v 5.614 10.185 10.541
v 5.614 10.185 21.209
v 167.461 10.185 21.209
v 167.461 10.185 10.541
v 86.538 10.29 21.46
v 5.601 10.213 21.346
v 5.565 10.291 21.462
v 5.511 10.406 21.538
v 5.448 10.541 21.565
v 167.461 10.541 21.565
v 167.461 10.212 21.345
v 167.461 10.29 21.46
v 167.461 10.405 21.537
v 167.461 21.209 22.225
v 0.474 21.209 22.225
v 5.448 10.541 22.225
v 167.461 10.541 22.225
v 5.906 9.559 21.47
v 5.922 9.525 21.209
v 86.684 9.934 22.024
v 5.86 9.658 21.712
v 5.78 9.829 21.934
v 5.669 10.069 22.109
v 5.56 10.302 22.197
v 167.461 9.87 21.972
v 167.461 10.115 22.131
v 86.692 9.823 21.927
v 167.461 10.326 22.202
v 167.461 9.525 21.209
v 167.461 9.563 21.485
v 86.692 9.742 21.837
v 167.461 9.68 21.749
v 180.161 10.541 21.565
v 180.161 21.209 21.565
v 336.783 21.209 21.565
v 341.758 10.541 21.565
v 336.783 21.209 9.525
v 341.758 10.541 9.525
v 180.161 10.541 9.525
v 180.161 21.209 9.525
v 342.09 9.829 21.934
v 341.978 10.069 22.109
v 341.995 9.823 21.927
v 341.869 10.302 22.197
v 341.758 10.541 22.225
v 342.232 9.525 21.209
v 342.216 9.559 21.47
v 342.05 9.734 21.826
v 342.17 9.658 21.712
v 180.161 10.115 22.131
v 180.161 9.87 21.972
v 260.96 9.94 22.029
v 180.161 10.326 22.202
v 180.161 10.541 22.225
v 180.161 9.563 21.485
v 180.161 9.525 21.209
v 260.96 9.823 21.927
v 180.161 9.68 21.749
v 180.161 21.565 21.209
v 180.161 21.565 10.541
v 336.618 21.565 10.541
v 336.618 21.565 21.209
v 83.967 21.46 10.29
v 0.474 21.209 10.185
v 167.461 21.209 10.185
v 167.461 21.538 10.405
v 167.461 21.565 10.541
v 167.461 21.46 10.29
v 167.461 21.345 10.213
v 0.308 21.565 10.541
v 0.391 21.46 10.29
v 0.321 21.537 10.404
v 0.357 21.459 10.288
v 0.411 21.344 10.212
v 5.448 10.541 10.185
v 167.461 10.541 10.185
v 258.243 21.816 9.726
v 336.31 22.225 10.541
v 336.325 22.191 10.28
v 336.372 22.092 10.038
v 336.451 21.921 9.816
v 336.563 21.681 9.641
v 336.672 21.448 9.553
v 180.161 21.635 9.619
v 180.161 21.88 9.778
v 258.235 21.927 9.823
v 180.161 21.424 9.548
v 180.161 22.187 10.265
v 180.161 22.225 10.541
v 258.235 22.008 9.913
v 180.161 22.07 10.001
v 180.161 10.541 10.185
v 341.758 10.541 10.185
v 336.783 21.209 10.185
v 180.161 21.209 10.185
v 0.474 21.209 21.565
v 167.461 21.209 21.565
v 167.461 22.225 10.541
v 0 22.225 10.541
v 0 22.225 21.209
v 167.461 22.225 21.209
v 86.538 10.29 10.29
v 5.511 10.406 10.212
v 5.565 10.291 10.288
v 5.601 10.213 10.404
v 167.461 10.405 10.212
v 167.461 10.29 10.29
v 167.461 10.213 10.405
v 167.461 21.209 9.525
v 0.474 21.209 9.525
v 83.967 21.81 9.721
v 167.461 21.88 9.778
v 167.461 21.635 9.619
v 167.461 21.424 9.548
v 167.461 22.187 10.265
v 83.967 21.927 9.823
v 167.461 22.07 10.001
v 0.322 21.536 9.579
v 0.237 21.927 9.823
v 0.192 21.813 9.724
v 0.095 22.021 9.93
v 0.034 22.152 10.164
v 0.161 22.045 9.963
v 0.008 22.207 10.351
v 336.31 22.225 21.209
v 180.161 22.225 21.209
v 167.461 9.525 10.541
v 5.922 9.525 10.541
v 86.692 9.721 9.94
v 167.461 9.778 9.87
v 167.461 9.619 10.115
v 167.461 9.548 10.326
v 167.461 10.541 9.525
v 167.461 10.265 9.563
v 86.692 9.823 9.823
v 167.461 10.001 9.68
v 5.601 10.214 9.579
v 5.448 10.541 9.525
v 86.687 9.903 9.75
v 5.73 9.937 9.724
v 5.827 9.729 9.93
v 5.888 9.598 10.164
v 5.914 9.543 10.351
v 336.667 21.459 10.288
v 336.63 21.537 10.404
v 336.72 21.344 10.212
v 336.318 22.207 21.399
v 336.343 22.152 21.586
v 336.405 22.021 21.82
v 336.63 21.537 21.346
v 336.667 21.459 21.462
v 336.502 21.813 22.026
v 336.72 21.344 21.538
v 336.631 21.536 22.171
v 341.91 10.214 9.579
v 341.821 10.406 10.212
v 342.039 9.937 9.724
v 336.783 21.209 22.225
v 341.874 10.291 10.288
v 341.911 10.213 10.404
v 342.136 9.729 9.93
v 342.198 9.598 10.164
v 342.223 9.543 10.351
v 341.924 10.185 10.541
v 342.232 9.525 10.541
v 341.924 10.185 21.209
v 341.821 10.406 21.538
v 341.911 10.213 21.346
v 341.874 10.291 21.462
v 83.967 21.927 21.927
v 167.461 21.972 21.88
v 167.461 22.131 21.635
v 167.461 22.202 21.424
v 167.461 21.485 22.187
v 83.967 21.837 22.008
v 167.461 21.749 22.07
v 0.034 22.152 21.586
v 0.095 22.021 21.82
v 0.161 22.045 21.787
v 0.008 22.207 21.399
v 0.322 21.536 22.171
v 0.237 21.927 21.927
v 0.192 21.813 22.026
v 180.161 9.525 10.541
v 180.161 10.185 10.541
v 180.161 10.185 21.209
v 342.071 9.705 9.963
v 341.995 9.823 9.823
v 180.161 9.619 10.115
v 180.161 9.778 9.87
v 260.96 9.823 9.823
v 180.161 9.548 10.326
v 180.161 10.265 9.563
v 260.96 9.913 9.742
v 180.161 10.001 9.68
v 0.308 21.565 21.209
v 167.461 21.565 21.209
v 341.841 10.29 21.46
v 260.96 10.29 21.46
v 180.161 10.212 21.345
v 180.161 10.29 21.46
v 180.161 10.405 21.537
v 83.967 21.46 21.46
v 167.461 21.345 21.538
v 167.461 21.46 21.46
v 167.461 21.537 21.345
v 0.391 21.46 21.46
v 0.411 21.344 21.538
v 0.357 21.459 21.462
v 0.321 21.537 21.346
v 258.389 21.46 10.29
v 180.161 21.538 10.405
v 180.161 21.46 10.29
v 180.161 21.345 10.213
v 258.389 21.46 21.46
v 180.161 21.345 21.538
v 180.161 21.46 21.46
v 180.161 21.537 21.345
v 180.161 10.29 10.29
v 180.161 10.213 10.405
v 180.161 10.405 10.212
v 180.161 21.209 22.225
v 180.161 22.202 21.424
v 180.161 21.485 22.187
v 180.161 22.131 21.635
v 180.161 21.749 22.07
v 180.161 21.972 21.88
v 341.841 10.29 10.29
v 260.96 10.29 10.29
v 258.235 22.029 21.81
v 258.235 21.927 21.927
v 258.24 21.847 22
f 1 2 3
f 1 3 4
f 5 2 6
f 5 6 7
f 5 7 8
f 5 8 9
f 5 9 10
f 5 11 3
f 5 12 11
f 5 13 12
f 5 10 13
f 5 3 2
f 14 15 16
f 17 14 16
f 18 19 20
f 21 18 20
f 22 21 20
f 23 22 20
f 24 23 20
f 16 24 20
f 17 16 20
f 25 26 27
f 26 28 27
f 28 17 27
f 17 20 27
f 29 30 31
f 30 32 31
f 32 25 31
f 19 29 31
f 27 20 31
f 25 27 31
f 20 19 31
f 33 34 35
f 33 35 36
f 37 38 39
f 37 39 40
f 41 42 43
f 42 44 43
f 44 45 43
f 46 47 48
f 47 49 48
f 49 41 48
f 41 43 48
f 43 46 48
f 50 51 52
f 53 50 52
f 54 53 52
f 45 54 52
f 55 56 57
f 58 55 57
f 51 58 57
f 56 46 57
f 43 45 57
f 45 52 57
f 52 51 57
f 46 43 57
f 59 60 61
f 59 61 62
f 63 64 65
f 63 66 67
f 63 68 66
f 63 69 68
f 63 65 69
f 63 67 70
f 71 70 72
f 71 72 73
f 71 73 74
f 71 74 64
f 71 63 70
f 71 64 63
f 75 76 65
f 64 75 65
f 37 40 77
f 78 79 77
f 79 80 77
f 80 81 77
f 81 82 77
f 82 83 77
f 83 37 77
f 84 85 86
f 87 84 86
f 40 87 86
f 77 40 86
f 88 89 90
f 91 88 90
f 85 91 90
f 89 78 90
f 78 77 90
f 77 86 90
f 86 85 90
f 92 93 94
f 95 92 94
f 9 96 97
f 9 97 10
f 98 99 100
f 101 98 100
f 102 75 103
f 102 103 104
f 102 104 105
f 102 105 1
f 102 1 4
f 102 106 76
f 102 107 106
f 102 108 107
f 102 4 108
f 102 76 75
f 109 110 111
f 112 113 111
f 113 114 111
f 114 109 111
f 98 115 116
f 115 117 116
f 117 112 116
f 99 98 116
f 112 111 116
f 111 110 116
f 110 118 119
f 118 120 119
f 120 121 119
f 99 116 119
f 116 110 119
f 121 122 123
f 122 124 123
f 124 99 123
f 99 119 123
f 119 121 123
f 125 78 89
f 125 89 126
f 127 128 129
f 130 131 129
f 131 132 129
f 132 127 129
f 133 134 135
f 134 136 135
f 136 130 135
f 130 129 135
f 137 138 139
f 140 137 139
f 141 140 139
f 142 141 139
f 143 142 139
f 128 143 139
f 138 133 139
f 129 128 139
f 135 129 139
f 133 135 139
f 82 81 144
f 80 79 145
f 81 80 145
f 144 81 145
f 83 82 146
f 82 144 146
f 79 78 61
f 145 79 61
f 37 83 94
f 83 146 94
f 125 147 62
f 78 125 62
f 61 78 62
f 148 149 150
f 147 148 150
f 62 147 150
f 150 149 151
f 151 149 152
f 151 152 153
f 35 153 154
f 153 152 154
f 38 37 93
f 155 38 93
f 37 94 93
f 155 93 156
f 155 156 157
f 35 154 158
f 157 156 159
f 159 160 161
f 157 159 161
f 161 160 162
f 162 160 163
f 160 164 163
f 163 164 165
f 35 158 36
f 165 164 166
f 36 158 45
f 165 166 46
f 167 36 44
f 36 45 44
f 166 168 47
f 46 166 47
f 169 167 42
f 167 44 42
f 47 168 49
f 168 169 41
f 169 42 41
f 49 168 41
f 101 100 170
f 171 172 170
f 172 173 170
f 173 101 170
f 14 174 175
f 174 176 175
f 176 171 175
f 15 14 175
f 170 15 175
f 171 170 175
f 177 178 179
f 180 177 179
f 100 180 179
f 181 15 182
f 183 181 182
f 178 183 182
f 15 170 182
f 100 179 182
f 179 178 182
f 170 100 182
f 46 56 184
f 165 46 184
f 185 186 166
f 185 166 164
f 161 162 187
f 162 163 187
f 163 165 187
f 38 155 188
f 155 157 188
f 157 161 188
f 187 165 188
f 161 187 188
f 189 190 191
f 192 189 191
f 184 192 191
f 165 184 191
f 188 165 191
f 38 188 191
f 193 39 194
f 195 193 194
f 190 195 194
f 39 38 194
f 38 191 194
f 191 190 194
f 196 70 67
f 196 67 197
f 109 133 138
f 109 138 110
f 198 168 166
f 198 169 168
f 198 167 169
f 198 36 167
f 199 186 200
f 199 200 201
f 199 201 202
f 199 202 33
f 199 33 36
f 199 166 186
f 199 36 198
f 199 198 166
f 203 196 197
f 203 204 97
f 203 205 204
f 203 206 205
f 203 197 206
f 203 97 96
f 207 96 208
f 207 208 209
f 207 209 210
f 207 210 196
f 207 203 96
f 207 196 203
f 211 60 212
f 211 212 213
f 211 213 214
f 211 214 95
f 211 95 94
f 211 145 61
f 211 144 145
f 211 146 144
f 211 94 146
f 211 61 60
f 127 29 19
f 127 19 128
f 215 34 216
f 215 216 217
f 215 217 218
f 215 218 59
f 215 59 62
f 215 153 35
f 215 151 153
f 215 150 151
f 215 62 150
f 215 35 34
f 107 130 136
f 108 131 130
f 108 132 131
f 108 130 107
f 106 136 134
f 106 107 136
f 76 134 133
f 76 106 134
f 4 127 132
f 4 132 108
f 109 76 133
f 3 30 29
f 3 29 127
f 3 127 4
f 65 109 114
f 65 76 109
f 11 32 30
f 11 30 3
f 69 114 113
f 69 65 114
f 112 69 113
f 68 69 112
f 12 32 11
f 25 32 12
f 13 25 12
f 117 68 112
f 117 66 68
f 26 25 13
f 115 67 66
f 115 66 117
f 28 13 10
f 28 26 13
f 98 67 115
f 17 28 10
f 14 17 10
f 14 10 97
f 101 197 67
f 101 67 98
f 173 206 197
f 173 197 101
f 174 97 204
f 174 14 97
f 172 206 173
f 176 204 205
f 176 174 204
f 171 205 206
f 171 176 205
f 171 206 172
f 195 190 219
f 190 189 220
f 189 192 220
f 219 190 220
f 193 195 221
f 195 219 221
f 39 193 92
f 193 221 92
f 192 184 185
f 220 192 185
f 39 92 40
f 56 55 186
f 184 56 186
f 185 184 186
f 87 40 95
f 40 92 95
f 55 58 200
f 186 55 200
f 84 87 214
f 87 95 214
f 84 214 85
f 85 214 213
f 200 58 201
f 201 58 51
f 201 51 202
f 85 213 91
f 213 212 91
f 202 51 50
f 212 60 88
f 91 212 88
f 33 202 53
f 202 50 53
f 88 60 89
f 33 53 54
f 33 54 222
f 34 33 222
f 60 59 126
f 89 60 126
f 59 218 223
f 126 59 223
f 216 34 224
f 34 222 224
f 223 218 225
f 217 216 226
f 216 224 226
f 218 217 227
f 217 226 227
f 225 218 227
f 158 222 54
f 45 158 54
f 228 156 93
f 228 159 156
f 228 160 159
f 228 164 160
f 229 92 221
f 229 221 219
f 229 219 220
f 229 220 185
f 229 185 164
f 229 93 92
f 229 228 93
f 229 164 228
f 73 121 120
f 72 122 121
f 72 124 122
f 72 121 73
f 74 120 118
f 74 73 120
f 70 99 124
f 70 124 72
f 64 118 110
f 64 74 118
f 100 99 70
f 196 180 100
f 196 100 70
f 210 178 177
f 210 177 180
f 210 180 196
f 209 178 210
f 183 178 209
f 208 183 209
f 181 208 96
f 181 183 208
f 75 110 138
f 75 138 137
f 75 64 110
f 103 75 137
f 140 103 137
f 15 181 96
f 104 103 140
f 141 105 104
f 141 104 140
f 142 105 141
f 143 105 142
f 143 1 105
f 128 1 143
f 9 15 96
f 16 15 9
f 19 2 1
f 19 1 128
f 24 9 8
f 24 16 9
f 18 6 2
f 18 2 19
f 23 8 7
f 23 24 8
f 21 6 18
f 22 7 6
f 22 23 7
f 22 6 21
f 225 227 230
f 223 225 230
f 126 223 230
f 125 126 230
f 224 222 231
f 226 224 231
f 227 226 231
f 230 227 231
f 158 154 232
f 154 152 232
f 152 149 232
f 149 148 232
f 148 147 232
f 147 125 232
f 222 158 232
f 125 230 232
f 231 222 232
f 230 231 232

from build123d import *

# Parameters (mm, degrees)
BOSS_EXTRUDE1_DEPTH = 393.7
SCALE1_SCALE_X      = 1
SCALE1_SCALE_Y      = 0.4
SCALE1_SCALE_Z      = 0.4
SKETCH2_W           = 12.7
SKETCH2_H           = 12.7
CUT_EXTRUDE1_DEPTH  = 395.531279762


with BuildPart() as part:
    # Sketch1 → Boss-Extrude1 (new body)
    with BuildSketch(Plane(origin=(0, 0, 0), x_dir=(0, 0, -1), z_dir=(1, 0, 0))):
        with BuildLine():
            Line((0, 2.54), (0, 29.21))
            ThreePointArc((0, 29.21), (-0.743948776, 31.006051224), (-2.54, 31.75))
            Line((-2.54, 31.75), (-29.21, 31.75))
            ThreePointArc((-29.21, 31.75), (-31.006051224, 31.006051224), (-31.75, 29.21))
            Line((-31.75, 29.21), (-31.75, 2.54))
            ThreePointArc((-31.75, 2.54), (-31.006051224, 0.743948776), (-29.21, 0))
            Line((-29.21, 0), (-2.54, 0))
            ThreePointArc((-2.54, 0), (-0.743948776, 0.743948776), (0, 2.54))
        make_face()
        with BuildLine():
            Line((-1.651, 2.54), (-1.651, 29.21))
            ThreePointArc((-1.651, 29.21), (-1.911382072, 29.838617928), (-2.54, 30.099))
            Line((-2.54, 30.099), (-29.21, 30.099))
            ThreePointArc((-29.21, 30.099), (-29.838617928, 29.838617928), (-30.099, 29.21))
            Line((-30.099, 29.21), (-30.099, 2.54))
            ThreePointArc((-30.099, 2.54), (-29.838617928, 1.911382072), (-29.21, 1.651))
            Line((-29.21, 1.651), (-2.54, 1.651))
            ThreePointArc((-2.54, 1.651), (-1.911382072, 1.911382072), (-1.651, 2.54))
        make_face(mode=Mode.SUBTRACT)
    extrude(amount=BOSS_EXTRUDE1_DEPTH)


with BuildPart() as part_1:
    # Scale1: scaled about (196.85, 15.875, 15.875)
    add(part.part.scale((SCALE1_SCALE_X, SCALE1_SCALE_Y, SCALE1_SCALE_Z), about=(196.85, 15.875, 15.875)))

    # Sketch2 → Cut-Extrude1 (cut, through all)
    with BuildSketch(Plane.XY.offset(22.225)):
        Polygon((0, 22.225), (5.922107259, 9.525), (0, 9.525), align=None)
        Polygon((336.3095897, 22.225), (342.231696958, 9.525), (360.905561886, 9.525), (360.905561886, 22.225), align=None)
        with Locations((173.811106521, 15.875)):
            Rectangle(SKETCH2_W, SKETCH2_H)
    extrude(amount=-CUT_EXTRUDE1_DEPTH, mode=Mode.SUBTRACT)


with BuildPart() as cut_extrude1_piece_1:
    # of the separate pieces the step leaves, piece 1, a body of its own (cut_extrude1_pieces_kept)
    add(part_1.part.solids().sort_by_distance((0.473768581, 21.209, 9.525))[0])


with BuildPart() as cut_extrude1_piece_2:
    # of the separate pieces the step leaves, piece 2, a body of its own (cut_extrude1_pieces_kept)
    add(part_1.part.solids().sort_by_distance((180.161106521, 21.209, 9.525))[0])


solid = Compound([cut_extrude1_piece_1.part, cut_extrude1_piece_2.part])
